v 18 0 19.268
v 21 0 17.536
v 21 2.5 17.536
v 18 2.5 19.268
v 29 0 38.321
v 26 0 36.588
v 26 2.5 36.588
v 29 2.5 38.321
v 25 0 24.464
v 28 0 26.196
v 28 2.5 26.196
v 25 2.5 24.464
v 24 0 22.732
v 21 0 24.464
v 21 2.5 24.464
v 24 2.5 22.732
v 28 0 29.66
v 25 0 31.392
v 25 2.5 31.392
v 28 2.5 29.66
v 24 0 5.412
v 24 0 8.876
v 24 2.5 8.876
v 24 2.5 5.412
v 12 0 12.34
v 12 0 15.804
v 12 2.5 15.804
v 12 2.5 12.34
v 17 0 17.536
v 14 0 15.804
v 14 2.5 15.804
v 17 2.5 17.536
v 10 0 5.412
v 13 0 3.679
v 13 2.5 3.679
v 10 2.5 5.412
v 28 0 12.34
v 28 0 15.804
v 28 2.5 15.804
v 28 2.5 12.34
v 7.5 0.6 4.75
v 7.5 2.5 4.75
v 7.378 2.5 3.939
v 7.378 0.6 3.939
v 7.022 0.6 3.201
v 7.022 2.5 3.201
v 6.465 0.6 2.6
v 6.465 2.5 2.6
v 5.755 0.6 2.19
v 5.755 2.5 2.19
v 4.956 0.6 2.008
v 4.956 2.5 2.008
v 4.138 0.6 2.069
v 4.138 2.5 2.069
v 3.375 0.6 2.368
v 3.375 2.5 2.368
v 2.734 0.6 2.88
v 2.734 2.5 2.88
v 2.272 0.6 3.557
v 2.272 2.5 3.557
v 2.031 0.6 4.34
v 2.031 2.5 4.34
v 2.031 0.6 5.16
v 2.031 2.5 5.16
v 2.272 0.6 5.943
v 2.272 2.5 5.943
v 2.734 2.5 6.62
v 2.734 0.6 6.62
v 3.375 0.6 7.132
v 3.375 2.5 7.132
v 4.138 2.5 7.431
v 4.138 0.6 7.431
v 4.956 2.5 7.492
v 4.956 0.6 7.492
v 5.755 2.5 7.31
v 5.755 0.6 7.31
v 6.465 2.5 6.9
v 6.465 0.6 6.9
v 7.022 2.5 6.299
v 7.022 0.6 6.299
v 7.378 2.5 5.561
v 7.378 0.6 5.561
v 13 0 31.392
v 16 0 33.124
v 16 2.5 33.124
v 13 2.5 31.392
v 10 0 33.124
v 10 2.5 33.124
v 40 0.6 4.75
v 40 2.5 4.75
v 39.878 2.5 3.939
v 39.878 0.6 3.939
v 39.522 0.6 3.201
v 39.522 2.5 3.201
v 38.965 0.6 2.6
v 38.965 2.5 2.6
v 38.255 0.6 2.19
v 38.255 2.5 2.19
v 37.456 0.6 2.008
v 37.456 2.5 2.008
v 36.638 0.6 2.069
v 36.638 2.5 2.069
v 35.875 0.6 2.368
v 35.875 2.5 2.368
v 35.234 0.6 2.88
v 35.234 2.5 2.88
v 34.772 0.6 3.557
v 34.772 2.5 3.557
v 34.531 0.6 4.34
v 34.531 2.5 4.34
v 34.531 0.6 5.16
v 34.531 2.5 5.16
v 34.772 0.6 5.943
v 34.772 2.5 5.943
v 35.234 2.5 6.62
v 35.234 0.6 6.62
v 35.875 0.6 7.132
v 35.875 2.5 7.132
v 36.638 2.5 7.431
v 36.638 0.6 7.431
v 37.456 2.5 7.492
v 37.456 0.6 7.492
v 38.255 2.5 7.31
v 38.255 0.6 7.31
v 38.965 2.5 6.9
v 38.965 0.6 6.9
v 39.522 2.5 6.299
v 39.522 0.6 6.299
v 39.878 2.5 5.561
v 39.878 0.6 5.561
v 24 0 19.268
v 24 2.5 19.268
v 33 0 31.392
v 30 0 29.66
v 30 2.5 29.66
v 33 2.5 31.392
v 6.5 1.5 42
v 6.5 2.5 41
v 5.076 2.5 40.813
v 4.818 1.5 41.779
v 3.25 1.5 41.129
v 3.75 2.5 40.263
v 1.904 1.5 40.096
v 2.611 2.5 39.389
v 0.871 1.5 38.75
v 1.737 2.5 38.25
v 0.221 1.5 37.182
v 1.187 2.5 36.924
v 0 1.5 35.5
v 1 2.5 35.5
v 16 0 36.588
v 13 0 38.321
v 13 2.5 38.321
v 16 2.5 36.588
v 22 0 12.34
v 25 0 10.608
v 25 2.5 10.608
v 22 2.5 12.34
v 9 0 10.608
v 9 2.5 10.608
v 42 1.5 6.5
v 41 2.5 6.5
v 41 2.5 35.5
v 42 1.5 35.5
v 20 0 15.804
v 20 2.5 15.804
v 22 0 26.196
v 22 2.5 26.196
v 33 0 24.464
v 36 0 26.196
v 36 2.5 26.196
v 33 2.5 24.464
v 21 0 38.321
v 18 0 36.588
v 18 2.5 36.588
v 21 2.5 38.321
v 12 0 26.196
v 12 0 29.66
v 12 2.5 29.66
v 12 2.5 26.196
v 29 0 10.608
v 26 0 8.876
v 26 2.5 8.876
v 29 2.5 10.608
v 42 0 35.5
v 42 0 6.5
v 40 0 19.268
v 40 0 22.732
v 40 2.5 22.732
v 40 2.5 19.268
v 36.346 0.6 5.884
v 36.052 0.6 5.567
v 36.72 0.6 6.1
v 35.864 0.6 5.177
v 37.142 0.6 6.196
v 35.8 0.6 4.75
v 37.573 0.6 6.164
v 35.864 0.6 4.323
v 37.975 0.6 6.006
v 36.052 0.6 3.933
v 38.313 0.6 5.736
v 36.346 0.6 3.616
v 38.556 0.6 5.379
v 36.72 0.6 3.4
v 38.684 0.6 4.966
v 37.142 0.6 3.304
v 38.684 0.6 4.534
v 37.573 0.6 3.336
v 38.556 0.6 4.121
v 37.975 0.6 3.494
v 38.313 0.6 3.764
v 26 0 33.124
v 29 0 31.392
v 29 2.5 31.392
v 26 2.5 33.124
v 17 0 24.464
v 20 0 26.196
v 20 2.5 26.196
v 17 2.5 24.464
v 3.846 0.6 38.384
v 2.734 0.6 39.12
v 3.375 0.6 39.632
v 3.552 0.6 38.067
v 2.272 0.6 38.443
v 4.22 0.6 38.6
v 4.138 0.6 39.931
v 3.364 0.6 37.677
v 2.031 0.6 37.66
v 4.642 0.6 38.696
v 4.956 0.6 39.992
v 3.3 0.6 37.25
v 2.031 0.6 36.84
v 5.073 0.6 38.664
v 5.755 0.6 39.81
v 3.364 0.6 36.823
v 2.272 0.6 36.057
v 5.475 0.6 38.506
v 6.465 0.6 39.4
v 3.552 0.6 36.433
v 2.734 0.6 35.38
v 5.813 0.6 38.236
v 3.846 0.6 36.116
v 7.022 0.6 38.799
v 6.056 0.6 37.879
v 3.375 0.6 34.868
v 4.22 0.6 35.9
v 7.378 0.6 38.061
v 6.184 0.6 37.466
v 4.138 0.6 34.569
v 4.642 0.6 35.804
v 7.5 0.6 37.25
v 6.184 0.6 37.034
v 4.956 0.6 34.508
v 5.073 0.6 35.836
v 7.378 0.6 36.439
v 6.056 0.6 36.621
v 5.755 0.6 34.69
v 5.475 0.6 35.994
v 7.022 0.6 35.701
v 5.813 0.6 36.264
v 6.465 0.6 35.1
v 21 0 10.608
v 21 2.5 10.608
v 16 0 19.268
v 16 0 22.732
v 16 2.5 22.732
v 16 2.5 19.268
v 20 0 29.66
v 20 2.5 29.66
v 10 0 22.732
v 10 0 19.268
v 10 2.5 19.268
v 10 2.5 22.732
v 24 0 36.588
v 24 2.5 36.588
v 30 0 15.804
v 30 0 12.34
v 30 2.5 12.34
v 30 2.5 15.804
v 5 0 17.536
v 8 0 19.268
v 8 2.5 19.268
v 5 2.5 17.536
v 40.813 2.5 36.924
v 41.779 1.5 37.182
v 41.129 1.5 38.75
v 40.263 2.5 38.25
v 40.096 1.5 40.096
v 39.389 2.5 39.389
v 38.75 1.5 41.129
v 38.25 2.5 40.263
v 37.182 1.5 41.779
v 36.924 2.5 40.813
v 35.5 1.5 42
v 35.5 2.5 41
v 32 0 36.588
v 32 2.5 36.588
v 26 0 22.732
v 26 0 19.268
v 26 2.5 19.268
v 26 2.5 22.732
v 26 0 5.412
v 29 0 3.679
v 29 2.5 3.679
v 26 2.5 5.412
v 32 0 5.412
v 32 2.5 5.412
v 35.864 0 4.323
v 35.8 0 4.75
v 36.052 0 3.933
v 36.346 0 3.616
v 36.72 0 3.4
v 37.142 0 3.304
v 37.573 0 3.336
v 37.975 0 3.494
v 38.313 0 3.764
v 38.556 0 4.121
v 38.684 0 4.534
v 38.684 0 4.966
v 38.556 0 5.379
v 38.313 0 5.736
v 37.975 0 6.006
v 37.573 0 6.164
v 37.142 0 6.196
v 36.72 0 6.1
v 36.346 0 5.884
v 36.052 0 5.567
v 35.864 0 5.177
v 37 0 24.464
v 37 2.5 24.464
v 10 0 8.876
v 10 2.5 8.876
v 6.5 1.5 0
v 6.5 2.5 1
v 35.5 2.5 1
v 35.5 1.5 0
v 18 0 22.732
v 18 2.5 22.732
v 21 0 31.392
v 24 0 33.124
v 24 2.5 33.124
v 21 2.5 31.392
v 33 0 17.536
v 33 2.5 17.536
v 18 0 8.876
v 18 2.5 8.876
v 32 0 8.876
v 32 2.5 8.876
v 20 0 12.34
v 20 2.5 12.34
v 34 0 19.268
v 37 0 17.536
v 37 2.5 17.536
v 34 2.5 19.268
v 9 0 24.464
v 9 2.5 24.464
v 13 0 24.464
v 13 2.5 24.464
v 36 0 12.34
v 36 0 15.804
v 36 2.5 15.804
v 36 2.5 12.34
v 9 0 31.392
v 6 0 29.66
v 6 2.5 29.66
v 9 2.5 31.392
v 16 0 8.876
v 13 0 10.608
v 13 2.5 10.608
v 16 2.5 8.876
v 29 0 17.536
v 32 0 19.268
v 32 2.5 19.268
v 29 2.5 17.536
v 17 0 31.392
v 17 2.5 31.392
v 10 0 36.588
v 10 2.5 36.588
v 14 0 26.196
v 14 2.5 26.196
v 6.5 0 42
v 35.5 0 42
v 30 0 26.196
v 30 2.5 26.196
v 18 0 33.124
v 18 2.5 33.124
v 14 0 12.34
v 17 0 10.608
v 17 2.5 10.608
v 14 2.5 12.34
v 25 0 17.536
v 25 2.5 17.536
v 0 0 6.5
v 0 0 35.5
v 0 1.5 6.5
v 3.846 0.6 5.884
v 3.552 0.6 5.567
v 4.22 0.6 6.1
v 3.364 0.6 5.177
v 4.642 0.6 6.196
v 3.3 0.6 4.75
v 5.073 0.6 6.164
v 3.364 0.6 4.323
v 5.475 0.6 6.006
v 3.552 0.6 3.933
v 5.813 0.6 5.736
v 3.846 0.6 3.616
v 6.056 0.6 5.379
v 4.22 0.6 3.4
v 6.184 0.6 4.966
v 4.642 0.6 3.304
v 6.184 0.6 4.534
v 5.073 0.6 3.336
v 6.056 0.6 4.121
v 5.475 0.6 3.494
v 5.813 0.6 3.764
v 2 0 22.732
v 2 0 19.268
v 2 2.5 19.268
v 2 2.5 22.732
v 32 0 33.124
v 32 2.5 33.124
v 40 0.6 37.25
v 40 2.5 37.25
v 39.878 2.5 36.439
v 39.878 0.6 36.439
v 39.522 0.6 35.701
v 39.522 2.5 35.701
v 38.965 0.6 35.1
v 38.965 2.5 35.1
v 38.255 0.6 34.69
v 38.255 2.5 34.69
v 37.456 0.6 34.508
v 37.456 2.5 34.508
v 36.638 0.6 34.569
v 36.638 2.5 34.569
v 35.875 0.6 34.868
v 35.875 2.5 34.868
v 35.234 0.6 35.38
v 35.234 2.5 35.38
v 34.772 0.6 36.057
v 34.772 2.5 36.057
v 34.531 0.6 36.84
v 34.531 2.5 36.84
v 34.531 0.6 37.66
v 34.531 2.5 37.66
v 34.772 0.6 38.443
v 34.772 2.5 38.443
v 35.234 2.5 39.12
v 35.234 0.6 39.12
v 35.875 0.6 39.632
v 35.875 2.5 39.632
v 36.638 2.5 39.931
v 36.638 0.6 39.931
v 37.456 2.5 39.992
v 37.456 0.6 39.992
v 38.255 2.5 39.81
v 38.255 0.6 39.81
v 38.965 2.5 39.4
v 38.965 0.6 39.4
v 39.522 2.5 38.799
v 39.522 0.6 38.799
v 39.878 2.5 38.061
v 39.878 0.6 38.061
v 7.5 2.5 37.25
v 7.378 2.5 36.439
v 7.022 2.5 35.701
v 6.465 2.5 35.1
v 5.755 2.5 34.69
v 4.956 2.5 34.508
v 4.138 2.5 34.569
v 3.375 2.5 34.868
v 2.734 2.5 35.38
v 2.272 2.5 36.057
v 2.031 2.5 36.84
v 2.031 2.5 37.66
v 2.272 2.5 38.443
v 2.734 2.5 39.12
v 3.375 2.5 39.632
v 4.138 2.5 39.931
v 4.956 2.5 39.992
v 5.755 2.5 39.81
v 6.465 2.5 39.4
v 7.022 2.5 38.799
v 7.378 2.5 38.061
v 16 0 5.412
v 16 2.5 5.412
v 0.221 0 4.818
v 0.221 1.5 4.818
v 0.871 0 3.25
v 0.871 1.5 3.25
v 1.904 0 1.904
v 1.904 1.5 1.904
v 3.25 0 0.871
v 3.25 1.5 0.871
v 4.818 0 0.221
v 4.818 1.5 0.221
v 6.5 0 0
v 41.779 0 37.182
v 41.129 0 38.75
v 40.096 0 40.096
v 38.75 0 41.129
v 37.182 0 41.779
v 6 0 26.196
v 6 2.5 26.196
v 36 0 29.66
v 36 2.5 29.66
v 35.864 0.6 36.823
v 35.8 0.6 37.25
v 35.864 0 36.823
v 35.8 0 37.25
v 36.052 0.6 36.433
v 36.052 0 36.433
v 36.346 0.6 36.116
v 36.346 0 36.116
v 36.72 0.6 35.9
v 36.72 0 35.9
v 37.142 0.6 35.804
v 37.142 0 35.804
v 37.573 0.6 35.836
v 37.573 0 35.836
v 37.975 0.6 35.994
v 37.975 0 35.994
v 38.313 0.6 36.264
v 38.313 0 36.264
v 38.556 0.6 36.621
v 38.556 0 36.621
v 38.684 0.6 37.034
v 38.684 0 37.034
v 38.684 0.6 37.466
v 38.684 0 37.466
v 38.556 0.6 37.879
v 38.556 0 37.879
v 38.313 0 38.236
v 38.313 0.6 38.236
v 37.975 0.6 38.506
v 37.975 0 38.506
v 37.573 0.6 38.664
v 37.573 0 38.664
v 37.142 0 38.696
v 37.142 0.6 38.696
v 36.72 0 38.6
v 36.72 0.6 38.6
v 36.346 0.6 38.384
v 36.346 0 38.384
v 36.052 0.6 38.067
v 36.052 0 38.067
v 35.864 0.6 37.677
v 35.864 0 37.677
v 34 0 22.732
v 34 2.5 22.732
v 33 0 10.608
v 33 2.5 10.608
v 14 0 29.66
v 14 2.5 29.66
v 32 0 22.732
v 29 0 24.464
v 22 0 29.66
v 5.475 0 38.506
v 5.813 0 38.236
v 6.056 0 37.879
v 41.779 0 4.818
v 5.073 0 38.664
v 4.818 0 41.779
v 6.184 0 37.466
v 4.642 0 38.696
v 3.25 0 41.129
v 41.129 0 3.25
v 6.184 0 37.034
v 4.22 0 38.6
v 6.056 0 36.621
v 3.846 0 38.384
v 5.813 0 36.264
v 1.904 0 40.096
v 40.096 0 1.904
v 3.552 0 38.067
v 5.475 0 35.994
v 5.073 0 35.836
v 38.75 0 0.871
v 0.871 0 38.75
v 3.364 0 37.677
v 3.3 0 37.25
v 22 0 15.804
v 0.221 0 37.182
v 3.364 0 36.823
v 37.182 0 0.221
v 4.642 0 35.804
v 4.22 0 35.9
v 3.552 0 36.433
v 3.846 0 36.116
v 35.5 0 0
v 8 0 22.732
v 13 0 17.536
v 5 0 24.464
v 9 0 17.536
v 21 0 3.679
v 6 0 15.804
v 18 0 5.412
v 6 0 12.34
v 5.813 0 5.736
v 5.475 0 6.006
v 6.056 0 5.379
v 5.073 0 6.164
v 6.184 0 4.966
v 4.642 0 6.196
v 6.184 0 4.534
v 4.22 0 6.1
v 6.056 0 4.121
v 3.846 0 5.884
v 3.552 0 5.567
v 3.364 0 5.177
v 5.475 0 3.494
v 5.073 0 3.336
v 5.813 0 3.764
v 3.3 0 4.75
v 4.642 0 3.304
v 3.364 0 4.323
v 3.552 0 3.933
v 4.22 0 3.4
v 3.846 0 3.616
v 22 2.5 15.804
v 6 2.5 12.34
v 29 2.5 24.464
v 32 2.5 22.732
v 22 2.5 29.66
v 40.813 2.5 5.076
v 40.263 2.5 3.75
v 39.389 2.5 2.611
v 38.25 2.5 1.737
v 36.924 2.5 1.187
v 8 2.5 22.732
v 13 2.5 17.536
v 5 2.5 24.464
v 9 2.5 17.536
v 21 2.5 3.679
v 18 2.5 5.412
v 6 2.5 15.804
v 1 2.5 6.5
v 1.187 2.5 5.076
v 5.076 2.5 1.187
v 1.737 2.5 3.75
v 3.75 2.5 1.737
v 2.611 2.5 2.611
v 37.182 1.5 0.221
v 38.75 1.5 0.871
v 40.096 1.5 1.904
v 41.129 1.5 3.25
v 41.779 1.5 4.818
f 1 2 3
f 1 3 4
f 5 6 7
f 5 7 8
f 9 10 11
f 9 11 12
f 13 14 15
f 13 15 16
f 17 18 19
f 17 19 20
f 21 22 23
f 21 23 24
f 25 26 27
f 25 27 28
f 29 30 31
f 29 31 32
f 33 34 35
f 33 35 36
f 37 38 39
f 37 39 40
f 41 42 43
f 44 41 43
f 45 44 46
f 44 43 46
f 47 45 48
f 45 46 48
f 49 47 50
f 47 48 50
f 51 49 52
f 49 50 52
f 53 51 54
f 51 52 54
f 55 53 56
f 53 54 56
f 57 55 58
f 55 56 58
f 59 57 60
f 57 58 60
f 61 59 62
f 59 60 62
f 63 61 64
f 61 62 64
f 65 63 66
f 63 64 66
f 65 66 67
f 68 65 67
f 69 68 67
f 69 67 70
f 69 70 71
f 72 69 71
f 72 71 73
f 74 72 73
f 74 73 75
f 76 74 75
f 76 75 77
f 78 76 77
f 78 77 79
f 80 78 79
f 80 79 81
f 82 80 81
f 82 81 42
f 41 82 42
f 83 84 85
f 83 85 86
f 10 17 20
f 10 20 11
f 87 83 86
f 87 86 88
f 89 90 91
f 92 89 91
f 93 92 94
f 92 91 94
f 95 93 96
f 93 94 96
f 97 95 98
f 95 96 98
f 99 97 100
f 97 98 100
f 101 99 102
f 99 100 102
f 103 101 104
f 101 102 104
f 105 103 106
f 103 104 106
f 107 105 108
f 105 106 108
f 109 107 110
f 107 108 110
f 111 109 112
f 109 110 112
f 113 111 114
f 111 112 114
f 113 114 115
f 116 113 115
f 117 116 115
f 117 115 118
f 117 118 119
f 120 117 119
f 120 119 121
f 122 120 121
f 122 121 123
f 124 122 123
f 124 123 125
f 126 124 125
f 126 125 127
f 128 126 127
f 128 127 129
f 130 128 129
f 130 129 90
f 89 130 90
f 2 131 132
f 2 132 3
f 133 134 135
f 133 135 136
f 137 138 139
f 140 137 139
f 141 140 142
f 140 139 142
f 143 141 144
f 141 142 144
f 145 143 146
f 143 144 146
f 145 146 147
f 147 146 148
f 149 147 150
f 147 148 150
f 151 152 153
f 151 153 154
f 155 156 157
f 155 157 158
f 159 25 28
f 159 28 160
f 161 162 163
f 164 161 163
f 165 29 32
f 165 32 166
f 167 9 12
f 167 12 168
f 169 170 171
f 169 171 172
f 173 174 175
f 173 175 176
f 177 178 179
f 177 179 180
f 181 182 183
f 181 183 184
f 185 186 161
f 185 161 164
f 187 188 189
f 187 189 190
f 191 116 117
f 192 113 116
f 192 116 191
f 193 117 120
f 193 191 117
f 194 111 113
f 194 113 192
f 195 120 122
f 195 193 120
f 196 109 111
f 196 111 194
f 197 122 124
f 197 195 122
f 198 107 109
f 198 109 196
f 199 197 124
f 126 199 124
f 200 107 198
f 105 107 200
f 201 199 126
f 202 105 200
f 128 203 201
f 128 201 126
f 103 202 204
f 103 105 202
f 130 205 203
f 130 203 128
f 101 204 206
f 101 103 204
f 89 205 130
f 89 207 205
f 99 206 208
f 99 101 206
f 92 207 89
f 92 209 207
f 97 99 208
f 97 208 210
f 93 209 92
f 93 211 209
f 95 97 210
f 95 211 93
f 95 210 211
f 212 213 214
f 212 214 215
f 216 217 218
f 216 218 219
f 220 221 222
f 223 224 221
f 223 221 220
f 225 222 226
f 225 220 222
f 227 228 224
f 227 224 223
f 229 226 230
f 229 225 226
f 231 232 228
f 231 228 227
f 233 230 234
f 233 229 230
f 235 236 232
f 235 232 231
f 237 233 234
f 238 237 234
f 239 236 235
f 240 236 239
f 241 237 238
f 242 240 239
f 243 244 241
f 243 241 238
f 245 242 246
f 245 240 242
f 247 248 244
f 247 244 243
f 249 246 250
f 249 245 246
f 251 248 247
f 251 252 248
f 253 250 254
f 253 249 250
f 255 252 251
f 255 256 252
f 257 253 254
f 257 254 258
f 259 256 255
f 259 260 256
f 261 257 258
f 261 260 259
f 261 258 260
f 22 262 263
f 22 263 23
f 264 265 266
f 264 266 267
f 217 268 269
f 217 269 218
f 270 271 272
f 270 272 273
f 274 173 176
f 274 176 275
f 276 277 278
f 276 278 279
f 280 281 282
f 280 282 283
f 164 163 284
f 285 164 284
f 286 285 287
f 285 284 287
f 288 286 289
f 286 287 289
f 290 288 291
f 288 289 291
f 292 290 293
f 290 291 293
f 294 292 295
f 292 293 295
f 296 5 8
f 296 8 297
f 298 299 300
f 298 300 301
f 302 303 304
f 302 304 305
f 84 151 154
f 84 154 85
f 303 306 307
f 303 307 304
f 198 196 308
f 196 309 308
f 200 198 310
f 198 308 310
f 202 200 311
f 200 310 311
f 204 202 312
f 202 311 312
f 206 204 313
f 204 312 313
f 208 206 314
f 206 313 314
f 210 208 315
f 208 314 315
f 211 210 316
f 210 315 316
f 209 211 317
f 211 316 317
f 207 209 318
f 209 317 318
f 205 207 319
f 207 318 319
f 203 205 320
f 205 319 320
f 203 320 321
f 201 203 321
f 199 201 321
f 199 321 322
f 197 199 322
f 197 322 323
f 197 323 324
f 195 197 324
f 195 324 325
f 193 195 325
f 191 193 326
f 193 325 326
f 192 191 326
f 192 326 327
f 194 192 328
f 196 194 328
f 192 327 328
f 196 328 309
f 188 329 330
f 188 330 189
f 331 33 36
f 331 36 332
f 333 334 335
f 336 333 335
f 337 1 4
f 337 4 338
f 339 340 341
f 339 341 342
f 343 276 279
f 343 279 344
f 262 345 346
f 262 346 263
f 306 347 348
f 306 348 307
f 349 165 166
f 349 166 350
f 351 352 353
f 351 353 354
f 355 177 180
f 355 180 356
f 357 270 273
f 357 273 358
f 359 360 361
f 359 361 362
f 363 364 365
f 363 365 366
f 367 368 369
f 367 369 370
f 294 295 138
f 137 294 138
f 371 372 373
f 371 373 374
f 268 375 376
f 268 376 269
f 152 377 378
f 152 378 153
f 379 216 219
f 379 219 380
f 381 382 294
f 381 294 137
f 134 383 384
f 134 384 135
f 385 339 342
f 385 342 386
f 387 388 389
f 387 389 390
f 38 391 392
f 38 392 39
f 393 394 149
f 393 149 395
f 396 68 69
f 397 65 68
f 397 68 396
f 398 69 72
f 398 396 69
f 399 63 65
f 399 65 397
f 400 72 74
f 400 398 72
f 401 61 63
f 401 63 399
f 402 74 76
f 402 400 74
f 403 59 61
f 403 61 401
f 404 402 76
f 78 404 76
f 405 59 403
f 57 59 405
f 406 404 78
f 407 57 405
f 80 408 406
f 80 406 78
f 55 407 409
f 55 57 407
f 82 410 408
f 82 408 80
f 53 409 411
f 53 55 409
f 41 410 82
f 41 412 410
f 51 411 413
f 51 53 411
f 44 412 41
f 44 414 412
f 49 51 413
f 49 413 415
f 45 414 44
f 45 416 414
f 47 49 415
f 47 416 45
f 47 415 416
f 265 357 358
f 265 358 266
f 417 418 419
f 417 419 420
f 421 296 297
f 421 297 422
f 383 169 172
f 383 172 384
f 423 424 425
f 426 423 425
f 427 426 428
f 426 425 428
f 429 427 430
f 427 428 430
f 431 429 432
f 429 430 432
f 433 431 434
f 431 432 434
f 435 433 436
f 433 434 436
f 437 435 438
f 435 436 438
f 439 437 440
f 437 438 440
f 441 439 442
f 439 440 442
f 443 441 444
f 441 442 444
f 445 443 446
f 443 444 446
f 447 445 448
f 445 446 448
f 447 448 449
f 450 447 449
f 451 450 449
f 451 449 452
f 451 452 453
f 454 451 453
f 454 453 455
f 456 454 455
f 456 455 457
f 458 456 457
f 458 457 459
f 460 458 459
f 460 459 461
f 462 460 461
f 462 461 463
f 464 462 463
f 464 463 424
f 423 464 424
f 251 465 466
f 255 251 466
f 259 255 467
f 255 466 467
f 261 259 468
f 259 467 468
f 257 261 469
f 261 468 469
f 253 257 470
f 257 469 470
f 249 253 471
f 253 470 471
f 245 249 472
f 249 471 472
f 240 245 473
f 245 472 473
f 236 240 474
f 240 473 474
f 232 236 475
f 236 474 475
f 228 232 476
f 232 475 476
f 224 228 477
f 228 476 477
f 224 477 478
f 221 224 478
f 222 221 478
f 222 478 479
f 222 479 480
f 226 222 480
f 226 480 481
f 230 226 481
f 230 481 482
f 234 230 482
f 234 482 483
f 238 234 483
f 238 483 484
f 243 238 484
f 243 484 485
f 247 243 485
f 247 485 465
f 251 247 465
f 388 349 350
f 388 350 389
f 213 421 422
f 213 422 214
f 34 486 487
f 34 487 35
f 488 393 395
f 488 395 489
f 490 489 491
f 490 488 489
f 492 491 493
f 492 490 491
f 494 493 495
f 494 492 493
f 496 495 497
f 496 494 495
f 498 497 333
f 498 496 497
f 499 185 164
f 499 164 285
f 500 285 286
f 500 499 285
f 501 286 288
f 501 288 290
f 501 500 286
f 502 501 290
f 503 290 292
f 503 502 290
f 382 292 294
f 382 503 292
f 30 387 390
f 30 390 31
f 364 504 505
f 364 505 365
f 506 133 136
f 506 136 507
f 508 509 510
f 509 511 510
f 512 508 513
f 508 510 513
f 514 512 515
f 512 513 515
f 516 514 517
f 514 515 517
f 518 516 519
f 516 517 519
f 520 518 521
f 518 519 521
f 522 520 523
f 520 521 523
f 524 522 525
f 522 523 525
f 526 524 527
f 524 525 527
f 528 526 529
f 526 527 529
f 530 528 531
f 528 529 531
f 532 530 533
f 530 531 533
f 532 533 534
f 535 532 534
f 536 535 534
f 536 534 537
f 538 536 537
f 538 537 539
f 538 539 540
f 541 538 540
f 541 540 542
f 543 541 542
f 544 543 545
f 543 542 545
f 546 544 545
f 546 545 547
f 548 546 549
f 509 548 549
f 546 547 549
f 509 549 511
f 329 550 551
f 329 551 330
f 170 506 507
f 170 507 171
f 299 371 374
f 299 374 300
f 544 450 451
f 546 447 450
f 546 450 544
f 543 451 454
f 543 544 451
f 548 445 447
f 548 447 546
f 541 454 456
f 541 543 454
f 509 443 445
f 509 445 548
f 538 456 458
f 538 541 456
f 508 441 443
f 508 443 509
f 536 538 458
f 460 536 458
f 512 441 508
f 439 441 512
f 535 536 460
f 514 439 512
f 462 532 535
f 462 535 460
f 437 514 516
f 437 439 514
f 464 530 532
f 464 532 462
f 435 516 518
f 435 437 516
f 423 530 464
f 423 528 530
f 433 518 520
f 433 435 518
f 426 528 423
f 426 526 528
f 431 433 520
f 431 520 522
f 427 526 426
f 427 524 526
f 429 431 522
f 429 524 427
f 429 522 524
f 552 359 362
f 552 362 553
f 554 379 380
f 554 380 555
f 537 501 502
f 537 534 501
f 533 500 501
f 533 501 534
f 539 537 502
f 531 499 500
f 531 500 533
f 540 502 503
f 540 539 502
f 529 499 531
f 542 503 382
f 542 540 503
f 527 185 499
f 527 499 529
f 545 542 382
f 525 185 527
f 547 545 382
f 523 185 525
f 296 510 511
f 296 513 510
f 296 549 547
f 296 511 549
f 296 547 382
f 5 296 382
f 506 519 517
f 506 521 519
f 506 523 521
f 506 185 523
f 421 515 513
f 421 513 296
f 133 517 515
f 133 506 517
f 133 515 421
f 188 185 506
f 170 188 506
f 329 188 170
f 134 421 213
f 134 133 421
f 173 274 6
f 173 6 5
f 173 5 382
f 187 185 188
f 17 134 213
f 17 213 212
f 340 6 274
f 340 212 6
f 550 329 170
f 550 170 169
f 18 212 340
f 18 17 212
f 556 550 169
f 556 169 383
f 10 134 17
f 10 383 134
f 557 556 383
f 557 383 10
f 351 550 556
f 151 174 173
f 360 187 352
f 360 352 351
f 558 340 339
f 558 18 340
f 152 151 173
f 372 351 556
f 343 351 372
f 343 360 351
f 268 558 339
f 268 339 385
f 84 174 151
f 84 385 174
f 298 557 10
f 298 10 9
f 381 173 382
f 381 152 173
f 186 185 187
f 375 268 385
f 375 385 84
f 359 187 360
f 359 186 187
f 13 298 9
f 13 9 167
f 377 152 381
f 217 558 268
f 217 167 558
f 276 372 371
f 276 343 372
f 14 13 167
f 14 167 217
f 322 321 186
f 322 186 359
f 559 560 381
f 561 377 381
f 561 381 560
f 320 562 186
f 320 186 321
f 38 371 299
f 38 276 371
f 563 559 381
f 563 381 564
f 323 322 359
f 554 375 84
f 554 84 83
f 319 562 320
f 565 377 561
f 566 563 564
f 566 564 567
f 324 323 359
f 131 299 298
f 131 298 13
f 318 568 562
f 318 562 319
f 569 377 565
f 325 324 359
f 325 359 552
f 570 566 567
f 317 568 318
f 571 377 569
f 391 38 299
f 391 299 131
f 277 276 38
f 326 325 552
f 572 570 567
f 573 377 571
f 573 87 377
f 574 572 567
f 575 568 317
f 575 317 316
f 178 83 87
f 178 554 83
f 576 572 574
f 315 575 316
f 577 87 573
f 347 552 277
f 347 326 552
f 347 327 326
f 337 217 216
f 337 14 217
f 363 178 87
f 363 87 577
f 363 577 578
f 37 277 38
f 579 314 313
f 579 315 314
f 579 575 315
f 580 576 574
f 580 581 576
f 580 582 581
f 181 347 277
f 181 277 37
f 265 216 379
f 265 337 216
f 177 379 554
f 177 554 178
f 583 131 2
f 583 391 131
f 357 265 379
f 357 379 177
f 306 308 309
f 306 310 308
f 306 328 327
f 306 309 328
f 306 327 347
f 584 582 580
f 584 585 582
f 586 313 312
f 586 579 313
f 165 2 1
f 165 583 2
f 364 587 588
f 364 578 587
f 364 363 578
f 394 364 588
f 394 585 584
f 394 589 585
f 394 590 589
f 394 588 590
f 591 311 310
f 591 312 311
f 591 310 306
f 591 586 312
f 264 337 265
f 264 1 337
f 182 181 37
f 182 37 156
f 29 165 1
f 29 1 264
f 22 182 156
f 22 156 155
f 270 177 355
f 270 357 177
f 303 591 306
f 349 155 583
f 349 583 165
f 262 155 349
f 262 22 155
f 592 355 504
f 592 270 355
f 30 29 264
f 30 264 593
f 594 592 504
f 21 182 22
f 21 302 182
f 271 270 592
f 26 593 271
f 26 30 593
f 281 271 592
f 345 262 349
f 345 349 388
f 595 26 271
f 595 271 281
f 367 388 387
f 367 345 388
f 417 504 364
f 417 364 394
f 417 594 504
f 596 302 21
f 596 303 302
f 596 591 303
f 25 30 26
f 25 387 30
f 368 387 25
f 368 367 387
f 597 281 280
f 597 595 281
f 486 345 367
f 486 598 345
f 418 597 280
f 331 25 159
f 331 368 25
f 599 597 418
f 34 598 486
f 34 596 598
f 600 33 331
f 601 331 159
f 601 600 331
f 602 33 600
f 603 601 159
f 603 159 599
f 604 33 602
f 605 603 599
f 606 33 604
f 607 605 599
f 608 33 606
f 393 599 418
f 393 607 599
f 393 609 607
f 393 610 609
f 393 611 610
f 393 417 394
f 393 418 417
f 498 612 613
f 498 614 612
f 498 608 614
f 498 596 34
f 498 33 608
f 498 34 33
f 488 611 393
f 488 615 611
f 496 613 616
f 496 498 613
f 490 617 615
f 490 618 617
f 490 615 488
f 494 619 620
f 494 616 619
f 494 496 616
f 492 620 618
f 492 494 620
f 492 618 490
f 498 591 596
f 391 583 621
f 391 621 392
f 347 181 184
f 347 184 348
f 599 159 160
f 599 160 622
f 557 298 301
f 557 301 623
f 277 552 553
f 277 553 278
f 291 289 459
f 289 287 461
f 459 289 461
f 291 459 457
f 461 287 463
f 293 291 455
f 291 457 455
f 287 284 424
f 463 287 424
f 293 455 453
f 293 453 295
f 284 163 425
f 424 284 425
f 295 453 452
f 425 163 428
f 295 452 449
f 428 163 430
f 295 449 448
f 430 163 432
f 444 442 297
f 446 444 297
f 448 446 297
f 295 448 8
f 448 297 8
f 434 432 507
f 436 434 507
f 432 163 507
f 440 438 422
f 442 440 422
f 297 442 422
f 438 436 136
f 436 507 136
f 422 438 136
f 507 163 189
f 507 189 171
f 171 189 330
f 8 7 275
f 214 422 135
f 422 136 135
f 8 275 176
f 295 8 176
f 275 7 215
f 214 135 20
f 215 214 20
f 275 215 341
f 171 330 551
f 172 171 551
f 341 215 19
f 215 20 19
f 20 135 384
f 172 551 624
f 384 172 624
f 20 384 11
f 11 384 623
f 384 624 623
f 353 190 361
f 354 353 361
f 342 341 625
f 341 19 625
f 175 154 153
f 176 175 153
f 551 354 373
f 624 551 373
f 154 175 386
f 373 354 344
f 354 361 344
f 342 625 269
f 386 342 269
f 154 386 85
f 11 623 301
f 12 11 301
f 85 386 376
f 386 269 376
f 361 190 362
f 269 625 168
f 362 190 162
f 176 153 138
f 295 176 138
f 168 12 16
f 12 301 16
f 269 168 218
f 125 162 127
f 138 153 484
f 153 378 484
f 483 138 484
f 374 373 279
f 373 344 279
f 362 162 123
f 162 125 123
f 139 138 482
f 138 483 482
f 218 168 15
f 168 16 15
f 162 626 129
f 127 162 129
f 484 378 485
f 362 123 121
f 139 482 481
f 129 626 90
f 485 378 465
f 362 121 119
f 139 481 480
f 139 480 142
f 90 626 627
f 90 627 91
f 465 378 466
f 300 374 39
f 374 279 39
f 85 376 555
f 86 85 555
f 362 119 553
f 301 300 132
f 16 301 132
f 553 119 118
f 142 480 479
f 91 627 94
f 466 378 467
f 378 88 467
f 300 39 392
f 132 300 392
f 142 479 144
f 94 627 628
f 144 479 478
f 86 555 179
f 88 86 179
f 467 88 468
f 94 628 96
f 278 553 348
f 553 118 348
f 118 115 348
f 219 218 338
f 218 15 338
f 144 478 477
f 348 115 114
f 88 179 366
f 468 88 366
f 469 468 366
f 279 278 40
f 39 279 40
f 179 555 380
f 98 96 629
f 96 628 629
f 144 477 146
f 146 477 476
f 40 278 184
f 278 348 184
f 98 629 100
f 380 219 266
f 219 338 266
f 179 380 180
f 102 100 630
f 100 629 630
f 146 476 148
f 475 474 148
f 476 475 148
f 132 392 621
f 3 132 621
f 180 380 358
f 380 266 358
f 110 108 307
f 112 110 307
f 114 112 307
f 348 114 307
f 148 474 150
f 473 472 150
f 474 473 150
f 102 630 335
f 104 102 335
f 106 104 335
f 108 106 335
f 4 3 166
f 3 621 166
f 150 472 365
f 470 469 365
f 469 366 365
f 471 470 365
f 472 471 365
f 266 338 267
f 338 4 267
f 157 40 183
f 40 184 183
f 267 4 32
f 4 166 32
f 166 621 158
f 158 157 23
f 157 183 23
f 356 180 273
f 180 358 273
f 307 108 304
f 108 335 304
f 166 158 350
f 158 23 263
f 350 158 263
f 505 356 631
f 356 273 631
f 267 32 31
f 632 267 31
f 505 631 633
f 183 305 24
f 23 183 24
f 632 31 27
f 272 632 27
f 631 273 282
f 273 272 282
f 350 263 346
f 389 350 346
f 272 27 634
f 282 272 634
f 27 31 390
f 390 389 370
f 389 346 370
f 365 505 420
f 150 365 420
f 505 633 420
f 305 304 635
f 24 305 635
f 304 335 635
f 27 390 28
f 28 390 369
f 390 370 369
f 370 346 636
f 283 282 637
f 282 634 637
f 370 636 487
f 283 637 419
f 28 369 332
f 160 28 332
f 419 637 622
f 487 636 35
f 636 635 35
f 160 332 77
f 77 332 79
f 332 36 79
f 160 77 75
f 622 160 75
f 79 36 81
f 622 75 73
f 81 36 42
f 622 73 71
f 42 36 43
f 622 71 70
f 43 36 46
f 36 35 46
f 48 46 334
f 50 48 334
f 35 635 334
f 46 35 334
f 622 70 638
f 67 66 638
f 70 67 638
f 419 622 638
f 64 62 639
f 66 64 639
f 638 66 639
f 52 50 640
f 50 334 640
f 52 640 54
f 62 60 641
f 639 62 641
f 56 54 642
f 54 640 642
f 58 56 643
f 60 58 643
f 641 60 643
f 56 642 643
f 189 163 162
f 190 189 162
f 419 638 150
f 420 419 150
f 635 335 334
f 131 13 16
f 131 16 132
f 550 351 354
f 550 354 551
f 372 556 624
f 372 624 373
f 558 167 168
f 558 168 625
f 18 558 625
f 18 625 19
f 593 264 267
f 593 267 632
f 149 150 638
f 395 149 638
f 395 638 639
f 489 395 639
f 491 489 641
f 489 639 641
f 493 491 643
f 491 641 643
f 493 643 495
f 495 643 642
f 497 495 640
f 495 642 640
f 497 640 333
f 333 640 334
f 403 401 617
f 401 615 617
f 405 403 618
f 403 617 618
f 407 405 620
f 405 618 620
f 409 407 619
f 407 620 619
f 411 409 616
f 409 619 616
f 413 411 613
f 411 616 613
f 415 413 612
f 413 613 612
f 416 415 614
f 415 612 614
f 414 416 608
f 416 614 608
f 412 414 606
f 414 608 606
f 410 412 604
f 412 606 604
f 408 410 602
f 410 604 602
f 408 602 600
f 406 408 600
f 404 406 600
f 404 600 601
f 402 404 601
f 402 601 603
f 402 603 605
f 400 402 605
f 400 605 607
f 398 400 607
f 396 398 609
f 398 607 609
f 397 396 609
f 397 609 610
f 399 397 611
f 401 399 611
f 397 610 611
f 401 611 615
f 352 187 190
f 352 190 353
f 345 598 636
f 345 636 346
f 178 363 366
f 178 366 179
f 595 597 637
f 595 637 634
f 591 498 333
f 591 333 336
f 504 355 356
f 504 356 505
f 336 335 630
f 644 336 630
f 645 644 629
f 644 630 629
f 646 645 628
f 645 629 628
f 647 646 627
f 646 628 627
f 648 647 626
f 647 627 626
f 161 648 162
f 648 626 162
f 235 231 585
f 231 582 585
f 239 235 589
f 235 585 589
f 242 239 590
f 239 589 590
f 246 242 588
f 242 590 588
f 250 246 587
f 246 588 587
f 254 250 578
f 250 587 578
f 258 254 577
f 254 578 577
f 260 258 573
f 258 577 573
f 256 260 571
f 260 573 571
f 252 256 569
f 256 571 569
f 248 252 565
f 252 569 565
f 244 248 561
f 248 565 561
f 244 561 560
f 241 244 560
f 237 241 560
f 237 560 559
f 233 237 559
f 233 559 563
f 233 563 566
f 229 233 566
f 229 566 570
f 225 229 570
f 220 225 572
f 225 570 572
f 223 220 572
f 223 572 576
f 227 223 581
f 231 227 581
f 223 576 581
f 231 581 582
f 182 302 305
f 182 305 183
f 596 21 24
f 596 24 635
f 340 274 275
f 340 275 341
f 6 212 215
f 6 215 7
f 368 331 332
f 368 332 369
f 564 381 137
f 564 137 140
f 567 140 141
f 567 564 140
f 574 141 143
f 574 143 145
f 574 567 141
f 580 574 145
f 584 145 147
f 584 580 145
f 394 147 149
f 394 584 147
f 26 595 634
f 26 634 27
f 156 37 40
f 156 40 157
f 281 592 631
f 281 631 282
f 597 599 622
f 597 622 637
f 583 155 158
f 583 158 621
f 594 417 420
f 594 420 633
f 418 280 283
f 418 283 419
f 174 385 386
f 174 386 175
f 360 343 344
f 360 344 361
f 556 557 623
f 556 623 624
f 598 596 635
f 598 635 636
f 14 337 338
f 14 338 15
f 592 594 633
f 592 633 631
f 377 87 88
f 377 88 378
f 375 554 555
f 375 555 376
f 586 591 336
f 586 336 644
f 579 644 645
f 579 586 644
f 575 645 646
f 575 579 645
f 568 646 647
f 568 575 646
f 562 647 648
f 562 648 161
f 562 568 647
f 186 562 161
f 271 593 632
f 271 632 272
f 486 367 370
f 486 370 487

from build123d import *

# Parameters (mm, degrees)
BOSS_EXTRUDE1_DEPTH                                  = 2.5
CBORE_FOR_M2_5_HEX_SOCKET_HEAD_CAP_SCREW_D           = 2.9
CBORE_FOR_M2_5_HEX_SOCKET_HEAD_CAP_SCREW_CBORE_D     = 5.5
CBORE_FOR_M2_5_HEX_SOCKET_HEAD_CAP_SCREW_CBORE_DEPTH = 1.9
FILL_PATTERN2_DEPTH                                  = 2.5
CHAMFER1_SIZE                                        = 1


# Read off the part's stored shape, not the designer's step: Fill Pattern2
with BuildPart() as part:
    # Sketch1 → Boss-Extrude1 (new body)
    with BuildSketch(Plane(origin=(0, 0, 0), x_dir=(1, 0, 0), z_dir=(0, 1, 0))):
        with BuildLine():
            Line((6.5, 0), (35.5, 0))
            ThreePointArc((35.5, 0), (40.096194078, -1.903805922), (42, -6.5))
            Line((42, -6.5), (42, -35.5))
            ThreePointArc((42, -35.5), (40.096194078, -40.096194078), (35.5, -42))
            Line((35.5, -42), (6.5, -42))
            ThreePointArc((6.5, -42), (1.903805922, -40.096194078), (0, -35.5))
            Line((0, -35.5), (0, -6.5))
            ThreePointArc((0, -6.5), (1.903805922, -1.903805922), (6.5, 0))
        make_face()
    extrude(amount=BOSS_EXTRUDE1_DEPTH)

    # CBORE for M2.5 Hex Socket Head Cap Screw1 (through all)
    with Locations(Plane(origin=(0, 2.5, 0), x_dir=(1, 0, 0), z_dir=(0, 1, 0))):
        with Locations((4.75, -37.25), (4.75, -4.75), (37.25, -4.75), (37.25, -37.25)):
            CounterBoreHole(CBORE_FOR_M2_5_HEX_SOCKET_HEAD_CAP_SCREW_D / 2, CBORE_FOR_M2_5_HEX_SOCKET_HEAD_CAP_SCREW_CBORE_D / 2, CBORE_FOR_M2_5_HEX_SOCKET_HEAD_CAP_SCREW_CBORE_DEPTH)

    # Fill Pattern2 outline → Fill Pattern2 (cut)
    with BuildSketch(Plane(origin=(0, 0, 0), x_dir=(1, 0, 0), z_dir=(0, 1, 0))):
        Polygon((8, -19.267949192), (5, -17.535898385), (2, -19.267949192), (2, -22.732050808), (5, -24.464101615), (8, -22.732050808), align=None)
        Polygon((20, -26.196152423), (17, -24.464101615), (14, -26.196152423), (14, -29.660254038), (17, -31.392304845), (20, -29.660254038), align=None)
        Polygon((32, -33.124355653), (29, -31.392304845), (26, -33.124355653), (26, -36.588457268), (29, -38.320508076), (32, -36.588457268), align=None)
        Polygon((29, -3.679491924), (26, -5.411542732), (26, -8.875644347), (29, -10.607695155), (32, -8.875644347), (32, -5.411542732), align=None)
        Polygon((17, -10.607695155), (14, -12.339745962), (14, -15.803847577), (17, -17.535898385), (20, -15.803847577), (20, -12.339745962), align=None)
        Polygon((36, -12.339745962), (33, -10.607695155), (30, -12.339745962), (30, -15.803847577), (33, -17.535898385), (36, -15.803847577), align=None)
        Polygon((24, -5.411542732), (21, -3.679491924), (18, -5.411542732), (18, -8.875644347), (21, -10.607695155), (24, -8.875644347), align=None)
        Polygon((9, -24.464101615), (6, -26.196152423), (6, -29.660254038), (9, -31.392304845), (12, -29.660254038), (12, -26.196152423), align=None)
        Polygon((21, -17.535898385), (18, -19.267949192), (18, -22.732050808), (21, -24.464101615), (24, -22.732050808), (24, -19.267949192), align=None)
        Polygon((30, -26.196152423), (30, -29.660254038), (33, -31.392304845), (36, -29.660254038), (36, -26.196152423), (33, -24.464101615), align=None)
        Polygon((26, -19.267949192), (26, -22.732050808), (29, -24.464101615), (32, -22.732050808), (32, -19.267949192), (29, -17.535898385), align=None)
        Polygon((16, -19.267949192), (13, -17.535898385), (10, -19.267949192), (10, -22.732050808), (13, -24.464101615), (16, -22.732050808), align=None)
        Polygon((28, -26.196152423), (25, -24.464101615), (22, -26.196152423), (22, -29.660254038), (25, -31.392304845), (28, -29.660254038), align=None)
        Polygon((25, -10.607695155), (22, -12.339745962), (22, -15.803847577), (25, -17.535898385), (28, -15.803847577), (28, -12.339745962), align=None)
        Polygon((10, -33.124355653), (10, -36.588457268), (13, -38.320508076), (16, -36.588457268), (16, -33.124355653), (13, -31.392304845), align=None)
        Polygon((10, -5.411542732), (10, -8.875644347), (13, -10.607695155), (16, -8.875644347), (16, -5.411542732), (13, -3.679491924), align=None)
        Polygon((12, -12.339745962), (9, -10.607695155), (6, -12.339745962), (6, -15.803847577), (9, -17.535898385), (12, -15.803847577), align=None)
        Polygon((37, -17.535898385), (34, -19.267949192), (34, -22.732050808), (37, -24.464101615), (40, -22.732050808), (40, -19.267949192), align=None)
        Polygon((24, -33.124355653), (21, -31.392304845), (18, -33.124355653), (18, -36.588457268), (21, -38.320508076), (24, -36.588457268), align=None)
    extrude(amount=FILL_PATTERN2_DEPTH, mode=Mode.SUBTRACT)

    # Chamfer1
    chamfer1_edges = [part.edges().sort_by_distance(p)[0] for p in [
        (40.096194078, 2.5, 1.903805922),
        (21, 2.5, 0),
        (1.903805922, 2.5, 1.903805922),
        (0, 2.5, 21),
        (1.903805922, 2.5, 40.096194078),
        (21, 2.5, 42),
        (40.096194078, 2.5, 40.096194078),
        (42, 2.5, 21),
    ]]
    chamfer(chamfer1_edges, length=CHAMFER1_SIZE)


solid = part.part
